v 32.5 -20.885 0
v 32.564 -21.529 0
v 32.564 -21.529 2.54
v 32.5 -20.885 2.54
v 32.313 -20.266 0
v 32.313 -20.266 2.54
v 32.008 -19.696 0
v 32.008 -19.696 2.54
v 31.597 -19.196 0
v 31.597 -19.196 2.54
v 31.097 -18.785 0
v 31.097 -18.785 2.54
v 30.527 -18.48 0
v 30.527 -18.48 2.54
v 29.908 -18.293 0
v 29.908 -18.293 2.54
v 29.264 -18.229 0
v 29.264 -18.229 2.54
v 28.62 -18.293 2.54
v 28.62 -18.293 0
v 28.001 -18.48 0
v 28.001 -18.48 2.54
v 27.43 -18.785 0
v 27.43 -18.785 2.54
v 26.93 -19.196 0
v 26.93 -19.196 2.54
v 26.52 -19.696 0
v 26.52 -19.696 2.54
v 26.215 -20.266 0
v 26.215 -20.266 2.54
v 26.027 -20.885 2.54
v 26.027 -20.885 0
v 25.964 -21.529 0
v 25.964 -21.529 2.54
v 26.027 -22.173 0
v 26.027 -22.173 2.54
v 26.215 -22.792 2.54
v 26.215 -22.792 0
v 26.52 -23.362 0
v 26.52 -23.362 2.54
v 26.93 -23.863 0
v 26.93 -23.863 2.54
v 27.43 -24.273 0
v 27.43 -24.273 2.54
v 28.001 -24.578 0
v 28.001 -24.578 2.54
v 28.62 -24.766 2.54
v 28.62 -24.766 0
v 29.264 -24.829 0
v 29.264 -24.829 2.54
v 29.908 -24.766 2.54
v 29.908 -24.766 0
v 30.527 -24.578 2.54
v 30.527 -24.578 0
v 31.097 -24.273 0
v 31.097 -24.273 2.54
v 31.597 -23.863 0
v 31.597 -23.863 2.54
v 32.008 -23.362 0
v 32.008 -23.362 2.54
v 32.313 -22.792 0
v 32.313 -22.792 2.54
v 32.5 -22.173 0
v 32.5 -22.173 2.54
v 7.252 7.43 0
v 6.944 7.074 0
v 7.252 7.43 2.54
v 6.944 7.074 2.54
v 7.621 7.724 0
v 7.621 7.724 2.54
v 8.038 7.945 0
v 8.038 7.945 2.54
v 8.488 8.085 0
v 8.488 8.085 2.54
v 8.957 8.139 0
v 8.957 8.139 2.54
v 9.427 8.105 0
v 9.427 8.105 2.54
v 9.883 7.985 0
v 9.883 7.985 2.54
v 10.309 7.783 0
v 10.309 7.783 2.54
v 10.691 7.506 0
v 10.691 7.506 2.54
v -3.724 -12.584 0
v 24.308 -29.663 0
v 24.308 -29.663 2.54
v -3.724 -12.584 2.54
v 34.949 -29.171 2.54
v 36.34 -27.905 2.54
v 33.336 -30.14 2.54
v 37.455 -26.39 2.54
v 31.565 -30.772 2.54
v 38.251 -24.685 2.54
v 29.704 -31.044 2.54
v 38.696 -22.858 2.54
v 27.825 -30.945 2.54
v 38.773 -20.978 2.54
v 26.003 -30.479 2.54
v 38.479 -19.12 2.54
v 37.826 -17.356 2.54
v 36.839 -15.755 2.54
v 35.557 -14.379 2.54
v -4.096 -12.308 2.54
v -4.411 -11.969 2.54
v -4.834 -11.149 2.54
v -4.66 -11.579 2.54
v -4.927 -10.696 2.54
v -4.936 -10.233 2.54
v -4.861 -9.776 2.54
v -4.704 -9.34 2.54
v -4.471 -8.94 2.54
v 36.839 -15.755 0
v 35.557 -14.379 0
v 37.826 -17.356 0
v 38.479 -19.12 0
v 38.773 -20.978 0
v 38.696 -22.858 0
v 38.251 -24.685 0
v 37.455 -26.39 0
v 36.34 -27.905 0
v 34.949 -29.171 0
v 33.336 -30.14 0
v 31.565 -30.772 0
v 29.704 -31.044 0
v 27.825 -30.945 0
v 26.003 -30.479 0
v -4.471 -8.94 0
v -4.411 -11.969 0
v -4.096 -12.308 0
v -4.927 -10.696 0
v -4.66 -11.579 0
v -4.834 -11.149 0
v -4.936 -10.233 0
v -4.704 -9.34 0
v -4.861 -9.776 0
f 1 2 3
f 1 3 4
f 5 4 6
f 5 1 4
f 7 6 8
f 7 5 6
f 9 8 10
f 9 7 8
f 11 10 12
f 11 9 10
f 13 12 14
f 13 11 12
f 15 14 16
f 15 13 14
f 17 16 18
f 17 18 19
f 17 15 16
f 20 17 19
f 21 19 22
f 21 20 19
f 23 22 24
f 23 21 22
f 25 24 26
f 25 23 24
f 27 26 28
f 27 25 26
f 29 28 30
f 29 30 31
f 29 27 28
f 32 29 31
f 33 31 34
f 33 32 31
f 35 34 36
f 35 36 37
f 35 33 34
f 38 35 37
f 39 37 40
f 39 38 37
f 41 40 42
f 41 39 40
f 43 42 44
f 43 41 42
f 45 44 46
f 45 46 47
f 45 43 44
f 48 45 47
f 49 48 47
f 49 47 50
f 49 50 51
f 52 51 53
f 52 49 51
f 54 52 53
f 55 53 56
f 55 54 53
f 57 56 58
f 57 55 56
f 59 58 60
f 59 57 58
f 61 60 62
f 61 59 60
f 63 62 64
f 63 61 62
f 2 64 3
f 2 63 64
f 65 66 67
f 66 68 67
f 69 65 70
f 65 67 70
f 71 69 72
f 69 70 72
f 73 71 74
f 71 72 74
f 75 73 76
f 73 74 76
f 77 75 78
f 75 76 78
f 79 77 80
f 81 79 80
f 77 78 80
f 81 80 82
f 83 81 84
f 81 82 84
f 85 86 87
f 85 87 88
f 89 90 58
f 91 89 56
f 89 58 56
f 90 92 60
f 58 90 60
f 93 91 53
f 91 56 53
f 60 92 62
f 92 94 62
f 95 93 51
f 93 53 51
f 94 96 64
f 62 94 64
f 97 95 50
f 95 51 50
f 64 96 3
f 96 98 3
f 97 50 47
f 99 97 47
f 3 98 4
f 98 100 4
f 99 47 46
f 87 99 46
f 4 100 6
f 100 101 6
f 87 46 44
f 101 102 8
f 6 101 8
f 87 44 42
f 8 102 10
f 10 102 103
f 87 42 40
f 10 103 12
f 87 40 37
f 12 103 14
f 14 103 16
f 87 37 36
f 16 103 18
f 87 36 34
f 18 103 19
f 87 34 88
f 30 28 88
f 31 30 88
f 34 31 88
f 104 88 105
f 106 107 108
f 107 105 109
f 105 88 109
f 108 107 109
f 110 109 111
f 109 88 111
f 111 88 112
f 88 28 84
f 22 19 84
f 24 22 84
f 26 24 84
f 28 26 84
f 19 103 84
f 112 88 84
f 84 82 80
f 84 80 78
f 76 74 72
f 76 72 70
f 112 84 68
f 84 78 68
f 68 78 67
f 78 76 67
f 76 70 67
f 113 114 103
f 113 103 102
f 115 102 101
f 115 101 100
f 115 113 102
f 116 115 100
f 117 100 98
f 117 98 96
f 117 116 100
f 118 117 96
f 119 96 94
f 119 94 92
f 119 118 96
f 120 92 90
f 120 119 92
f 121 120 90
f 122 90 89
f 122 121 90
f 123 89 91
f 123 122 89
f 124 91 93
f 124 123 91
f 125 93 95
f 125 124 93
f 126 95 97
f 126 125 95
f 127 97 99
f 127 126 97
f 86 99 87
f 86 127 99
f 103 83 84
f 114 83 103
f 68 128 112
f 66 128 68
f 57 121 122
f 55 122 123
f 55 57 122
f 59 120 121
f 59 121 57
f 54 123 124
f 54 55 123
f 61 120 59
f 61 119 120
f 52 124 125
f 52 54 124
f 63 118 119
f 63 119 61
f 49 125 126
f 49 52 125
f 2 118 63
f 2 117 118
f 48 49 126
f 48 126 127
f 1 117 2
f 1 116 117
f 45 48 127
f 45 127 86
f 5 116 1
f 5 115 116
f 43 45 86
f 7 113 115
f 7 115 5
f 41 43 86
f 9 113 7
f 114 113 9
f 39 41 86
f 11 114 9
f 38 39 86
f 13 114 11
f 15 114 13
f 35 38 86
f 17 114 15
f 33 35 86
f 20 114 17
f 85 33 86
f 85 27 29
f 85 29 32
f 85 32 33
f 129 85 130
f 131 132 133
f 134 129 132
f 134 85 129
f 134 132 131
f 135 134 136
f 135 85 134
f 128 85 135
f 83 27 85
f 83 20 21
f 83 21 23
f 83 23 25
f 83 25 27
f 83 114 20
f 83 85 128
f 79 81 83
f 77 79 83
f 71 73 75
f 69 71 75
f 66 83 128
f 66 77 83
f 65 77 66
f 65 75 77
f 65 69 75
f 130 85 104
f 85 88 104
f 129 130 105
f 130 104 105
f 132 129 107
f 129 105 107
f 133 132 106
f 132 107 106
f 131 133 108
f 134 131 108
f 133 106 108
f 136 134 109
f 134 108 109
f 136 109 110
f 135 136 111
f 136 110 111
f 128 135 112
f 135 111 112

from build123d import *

# Parameters (mm, degrees)
SKETCH1_R           = 3.3
BOSS_EXTRUDE3_DEPTH = 2.54
FILLET1_R           = 2.54
FILLET2_R           = 2.54


with BuildPart() as part:
    # Sketch1 → Boss-Extrude3 (new body)
    with BuildSketch(Plane.XY):
        with BuildLine():
            Line((24.307803938, -29.663229905), (-6.055469212, -11.163390731))
            Line((-6.055469212, -11.163390731), (8.577809795, 9.365424663))
            Line((8.577809795, 9.365424663), (35.556707766, -14.378954182))
            ThreePointArc((35.556707766, -14.378954182), (36.935104815, -27.175040842), (24.307803938, -29.663229905))
        make_face()
        with Locations((29.263786665, -21.529112854)):
            Circle(SKETCH1_R, mode=Mode.SUBTRACT)
    extrude(amount=BOSS_EXTRUDE3_DEPTH)

    # Fillet1
    fillet1_edges = [part.edges().sort_by_distance(p)[0] for p in [
        (-6.055469212, -11.163390731, 1.27),
    ]]
    fillet(fillet1_edges, radius=FILLET1_R)

    # Fillet2
    fillet2_edges = [part.edges().sort_by_distance(p)[0] for p in [
        (8.577809795, 9.365424663, 1.27),
    ]]
    fillet(fillet2_edges, radius=FILLET2_R)


solid = part.part
